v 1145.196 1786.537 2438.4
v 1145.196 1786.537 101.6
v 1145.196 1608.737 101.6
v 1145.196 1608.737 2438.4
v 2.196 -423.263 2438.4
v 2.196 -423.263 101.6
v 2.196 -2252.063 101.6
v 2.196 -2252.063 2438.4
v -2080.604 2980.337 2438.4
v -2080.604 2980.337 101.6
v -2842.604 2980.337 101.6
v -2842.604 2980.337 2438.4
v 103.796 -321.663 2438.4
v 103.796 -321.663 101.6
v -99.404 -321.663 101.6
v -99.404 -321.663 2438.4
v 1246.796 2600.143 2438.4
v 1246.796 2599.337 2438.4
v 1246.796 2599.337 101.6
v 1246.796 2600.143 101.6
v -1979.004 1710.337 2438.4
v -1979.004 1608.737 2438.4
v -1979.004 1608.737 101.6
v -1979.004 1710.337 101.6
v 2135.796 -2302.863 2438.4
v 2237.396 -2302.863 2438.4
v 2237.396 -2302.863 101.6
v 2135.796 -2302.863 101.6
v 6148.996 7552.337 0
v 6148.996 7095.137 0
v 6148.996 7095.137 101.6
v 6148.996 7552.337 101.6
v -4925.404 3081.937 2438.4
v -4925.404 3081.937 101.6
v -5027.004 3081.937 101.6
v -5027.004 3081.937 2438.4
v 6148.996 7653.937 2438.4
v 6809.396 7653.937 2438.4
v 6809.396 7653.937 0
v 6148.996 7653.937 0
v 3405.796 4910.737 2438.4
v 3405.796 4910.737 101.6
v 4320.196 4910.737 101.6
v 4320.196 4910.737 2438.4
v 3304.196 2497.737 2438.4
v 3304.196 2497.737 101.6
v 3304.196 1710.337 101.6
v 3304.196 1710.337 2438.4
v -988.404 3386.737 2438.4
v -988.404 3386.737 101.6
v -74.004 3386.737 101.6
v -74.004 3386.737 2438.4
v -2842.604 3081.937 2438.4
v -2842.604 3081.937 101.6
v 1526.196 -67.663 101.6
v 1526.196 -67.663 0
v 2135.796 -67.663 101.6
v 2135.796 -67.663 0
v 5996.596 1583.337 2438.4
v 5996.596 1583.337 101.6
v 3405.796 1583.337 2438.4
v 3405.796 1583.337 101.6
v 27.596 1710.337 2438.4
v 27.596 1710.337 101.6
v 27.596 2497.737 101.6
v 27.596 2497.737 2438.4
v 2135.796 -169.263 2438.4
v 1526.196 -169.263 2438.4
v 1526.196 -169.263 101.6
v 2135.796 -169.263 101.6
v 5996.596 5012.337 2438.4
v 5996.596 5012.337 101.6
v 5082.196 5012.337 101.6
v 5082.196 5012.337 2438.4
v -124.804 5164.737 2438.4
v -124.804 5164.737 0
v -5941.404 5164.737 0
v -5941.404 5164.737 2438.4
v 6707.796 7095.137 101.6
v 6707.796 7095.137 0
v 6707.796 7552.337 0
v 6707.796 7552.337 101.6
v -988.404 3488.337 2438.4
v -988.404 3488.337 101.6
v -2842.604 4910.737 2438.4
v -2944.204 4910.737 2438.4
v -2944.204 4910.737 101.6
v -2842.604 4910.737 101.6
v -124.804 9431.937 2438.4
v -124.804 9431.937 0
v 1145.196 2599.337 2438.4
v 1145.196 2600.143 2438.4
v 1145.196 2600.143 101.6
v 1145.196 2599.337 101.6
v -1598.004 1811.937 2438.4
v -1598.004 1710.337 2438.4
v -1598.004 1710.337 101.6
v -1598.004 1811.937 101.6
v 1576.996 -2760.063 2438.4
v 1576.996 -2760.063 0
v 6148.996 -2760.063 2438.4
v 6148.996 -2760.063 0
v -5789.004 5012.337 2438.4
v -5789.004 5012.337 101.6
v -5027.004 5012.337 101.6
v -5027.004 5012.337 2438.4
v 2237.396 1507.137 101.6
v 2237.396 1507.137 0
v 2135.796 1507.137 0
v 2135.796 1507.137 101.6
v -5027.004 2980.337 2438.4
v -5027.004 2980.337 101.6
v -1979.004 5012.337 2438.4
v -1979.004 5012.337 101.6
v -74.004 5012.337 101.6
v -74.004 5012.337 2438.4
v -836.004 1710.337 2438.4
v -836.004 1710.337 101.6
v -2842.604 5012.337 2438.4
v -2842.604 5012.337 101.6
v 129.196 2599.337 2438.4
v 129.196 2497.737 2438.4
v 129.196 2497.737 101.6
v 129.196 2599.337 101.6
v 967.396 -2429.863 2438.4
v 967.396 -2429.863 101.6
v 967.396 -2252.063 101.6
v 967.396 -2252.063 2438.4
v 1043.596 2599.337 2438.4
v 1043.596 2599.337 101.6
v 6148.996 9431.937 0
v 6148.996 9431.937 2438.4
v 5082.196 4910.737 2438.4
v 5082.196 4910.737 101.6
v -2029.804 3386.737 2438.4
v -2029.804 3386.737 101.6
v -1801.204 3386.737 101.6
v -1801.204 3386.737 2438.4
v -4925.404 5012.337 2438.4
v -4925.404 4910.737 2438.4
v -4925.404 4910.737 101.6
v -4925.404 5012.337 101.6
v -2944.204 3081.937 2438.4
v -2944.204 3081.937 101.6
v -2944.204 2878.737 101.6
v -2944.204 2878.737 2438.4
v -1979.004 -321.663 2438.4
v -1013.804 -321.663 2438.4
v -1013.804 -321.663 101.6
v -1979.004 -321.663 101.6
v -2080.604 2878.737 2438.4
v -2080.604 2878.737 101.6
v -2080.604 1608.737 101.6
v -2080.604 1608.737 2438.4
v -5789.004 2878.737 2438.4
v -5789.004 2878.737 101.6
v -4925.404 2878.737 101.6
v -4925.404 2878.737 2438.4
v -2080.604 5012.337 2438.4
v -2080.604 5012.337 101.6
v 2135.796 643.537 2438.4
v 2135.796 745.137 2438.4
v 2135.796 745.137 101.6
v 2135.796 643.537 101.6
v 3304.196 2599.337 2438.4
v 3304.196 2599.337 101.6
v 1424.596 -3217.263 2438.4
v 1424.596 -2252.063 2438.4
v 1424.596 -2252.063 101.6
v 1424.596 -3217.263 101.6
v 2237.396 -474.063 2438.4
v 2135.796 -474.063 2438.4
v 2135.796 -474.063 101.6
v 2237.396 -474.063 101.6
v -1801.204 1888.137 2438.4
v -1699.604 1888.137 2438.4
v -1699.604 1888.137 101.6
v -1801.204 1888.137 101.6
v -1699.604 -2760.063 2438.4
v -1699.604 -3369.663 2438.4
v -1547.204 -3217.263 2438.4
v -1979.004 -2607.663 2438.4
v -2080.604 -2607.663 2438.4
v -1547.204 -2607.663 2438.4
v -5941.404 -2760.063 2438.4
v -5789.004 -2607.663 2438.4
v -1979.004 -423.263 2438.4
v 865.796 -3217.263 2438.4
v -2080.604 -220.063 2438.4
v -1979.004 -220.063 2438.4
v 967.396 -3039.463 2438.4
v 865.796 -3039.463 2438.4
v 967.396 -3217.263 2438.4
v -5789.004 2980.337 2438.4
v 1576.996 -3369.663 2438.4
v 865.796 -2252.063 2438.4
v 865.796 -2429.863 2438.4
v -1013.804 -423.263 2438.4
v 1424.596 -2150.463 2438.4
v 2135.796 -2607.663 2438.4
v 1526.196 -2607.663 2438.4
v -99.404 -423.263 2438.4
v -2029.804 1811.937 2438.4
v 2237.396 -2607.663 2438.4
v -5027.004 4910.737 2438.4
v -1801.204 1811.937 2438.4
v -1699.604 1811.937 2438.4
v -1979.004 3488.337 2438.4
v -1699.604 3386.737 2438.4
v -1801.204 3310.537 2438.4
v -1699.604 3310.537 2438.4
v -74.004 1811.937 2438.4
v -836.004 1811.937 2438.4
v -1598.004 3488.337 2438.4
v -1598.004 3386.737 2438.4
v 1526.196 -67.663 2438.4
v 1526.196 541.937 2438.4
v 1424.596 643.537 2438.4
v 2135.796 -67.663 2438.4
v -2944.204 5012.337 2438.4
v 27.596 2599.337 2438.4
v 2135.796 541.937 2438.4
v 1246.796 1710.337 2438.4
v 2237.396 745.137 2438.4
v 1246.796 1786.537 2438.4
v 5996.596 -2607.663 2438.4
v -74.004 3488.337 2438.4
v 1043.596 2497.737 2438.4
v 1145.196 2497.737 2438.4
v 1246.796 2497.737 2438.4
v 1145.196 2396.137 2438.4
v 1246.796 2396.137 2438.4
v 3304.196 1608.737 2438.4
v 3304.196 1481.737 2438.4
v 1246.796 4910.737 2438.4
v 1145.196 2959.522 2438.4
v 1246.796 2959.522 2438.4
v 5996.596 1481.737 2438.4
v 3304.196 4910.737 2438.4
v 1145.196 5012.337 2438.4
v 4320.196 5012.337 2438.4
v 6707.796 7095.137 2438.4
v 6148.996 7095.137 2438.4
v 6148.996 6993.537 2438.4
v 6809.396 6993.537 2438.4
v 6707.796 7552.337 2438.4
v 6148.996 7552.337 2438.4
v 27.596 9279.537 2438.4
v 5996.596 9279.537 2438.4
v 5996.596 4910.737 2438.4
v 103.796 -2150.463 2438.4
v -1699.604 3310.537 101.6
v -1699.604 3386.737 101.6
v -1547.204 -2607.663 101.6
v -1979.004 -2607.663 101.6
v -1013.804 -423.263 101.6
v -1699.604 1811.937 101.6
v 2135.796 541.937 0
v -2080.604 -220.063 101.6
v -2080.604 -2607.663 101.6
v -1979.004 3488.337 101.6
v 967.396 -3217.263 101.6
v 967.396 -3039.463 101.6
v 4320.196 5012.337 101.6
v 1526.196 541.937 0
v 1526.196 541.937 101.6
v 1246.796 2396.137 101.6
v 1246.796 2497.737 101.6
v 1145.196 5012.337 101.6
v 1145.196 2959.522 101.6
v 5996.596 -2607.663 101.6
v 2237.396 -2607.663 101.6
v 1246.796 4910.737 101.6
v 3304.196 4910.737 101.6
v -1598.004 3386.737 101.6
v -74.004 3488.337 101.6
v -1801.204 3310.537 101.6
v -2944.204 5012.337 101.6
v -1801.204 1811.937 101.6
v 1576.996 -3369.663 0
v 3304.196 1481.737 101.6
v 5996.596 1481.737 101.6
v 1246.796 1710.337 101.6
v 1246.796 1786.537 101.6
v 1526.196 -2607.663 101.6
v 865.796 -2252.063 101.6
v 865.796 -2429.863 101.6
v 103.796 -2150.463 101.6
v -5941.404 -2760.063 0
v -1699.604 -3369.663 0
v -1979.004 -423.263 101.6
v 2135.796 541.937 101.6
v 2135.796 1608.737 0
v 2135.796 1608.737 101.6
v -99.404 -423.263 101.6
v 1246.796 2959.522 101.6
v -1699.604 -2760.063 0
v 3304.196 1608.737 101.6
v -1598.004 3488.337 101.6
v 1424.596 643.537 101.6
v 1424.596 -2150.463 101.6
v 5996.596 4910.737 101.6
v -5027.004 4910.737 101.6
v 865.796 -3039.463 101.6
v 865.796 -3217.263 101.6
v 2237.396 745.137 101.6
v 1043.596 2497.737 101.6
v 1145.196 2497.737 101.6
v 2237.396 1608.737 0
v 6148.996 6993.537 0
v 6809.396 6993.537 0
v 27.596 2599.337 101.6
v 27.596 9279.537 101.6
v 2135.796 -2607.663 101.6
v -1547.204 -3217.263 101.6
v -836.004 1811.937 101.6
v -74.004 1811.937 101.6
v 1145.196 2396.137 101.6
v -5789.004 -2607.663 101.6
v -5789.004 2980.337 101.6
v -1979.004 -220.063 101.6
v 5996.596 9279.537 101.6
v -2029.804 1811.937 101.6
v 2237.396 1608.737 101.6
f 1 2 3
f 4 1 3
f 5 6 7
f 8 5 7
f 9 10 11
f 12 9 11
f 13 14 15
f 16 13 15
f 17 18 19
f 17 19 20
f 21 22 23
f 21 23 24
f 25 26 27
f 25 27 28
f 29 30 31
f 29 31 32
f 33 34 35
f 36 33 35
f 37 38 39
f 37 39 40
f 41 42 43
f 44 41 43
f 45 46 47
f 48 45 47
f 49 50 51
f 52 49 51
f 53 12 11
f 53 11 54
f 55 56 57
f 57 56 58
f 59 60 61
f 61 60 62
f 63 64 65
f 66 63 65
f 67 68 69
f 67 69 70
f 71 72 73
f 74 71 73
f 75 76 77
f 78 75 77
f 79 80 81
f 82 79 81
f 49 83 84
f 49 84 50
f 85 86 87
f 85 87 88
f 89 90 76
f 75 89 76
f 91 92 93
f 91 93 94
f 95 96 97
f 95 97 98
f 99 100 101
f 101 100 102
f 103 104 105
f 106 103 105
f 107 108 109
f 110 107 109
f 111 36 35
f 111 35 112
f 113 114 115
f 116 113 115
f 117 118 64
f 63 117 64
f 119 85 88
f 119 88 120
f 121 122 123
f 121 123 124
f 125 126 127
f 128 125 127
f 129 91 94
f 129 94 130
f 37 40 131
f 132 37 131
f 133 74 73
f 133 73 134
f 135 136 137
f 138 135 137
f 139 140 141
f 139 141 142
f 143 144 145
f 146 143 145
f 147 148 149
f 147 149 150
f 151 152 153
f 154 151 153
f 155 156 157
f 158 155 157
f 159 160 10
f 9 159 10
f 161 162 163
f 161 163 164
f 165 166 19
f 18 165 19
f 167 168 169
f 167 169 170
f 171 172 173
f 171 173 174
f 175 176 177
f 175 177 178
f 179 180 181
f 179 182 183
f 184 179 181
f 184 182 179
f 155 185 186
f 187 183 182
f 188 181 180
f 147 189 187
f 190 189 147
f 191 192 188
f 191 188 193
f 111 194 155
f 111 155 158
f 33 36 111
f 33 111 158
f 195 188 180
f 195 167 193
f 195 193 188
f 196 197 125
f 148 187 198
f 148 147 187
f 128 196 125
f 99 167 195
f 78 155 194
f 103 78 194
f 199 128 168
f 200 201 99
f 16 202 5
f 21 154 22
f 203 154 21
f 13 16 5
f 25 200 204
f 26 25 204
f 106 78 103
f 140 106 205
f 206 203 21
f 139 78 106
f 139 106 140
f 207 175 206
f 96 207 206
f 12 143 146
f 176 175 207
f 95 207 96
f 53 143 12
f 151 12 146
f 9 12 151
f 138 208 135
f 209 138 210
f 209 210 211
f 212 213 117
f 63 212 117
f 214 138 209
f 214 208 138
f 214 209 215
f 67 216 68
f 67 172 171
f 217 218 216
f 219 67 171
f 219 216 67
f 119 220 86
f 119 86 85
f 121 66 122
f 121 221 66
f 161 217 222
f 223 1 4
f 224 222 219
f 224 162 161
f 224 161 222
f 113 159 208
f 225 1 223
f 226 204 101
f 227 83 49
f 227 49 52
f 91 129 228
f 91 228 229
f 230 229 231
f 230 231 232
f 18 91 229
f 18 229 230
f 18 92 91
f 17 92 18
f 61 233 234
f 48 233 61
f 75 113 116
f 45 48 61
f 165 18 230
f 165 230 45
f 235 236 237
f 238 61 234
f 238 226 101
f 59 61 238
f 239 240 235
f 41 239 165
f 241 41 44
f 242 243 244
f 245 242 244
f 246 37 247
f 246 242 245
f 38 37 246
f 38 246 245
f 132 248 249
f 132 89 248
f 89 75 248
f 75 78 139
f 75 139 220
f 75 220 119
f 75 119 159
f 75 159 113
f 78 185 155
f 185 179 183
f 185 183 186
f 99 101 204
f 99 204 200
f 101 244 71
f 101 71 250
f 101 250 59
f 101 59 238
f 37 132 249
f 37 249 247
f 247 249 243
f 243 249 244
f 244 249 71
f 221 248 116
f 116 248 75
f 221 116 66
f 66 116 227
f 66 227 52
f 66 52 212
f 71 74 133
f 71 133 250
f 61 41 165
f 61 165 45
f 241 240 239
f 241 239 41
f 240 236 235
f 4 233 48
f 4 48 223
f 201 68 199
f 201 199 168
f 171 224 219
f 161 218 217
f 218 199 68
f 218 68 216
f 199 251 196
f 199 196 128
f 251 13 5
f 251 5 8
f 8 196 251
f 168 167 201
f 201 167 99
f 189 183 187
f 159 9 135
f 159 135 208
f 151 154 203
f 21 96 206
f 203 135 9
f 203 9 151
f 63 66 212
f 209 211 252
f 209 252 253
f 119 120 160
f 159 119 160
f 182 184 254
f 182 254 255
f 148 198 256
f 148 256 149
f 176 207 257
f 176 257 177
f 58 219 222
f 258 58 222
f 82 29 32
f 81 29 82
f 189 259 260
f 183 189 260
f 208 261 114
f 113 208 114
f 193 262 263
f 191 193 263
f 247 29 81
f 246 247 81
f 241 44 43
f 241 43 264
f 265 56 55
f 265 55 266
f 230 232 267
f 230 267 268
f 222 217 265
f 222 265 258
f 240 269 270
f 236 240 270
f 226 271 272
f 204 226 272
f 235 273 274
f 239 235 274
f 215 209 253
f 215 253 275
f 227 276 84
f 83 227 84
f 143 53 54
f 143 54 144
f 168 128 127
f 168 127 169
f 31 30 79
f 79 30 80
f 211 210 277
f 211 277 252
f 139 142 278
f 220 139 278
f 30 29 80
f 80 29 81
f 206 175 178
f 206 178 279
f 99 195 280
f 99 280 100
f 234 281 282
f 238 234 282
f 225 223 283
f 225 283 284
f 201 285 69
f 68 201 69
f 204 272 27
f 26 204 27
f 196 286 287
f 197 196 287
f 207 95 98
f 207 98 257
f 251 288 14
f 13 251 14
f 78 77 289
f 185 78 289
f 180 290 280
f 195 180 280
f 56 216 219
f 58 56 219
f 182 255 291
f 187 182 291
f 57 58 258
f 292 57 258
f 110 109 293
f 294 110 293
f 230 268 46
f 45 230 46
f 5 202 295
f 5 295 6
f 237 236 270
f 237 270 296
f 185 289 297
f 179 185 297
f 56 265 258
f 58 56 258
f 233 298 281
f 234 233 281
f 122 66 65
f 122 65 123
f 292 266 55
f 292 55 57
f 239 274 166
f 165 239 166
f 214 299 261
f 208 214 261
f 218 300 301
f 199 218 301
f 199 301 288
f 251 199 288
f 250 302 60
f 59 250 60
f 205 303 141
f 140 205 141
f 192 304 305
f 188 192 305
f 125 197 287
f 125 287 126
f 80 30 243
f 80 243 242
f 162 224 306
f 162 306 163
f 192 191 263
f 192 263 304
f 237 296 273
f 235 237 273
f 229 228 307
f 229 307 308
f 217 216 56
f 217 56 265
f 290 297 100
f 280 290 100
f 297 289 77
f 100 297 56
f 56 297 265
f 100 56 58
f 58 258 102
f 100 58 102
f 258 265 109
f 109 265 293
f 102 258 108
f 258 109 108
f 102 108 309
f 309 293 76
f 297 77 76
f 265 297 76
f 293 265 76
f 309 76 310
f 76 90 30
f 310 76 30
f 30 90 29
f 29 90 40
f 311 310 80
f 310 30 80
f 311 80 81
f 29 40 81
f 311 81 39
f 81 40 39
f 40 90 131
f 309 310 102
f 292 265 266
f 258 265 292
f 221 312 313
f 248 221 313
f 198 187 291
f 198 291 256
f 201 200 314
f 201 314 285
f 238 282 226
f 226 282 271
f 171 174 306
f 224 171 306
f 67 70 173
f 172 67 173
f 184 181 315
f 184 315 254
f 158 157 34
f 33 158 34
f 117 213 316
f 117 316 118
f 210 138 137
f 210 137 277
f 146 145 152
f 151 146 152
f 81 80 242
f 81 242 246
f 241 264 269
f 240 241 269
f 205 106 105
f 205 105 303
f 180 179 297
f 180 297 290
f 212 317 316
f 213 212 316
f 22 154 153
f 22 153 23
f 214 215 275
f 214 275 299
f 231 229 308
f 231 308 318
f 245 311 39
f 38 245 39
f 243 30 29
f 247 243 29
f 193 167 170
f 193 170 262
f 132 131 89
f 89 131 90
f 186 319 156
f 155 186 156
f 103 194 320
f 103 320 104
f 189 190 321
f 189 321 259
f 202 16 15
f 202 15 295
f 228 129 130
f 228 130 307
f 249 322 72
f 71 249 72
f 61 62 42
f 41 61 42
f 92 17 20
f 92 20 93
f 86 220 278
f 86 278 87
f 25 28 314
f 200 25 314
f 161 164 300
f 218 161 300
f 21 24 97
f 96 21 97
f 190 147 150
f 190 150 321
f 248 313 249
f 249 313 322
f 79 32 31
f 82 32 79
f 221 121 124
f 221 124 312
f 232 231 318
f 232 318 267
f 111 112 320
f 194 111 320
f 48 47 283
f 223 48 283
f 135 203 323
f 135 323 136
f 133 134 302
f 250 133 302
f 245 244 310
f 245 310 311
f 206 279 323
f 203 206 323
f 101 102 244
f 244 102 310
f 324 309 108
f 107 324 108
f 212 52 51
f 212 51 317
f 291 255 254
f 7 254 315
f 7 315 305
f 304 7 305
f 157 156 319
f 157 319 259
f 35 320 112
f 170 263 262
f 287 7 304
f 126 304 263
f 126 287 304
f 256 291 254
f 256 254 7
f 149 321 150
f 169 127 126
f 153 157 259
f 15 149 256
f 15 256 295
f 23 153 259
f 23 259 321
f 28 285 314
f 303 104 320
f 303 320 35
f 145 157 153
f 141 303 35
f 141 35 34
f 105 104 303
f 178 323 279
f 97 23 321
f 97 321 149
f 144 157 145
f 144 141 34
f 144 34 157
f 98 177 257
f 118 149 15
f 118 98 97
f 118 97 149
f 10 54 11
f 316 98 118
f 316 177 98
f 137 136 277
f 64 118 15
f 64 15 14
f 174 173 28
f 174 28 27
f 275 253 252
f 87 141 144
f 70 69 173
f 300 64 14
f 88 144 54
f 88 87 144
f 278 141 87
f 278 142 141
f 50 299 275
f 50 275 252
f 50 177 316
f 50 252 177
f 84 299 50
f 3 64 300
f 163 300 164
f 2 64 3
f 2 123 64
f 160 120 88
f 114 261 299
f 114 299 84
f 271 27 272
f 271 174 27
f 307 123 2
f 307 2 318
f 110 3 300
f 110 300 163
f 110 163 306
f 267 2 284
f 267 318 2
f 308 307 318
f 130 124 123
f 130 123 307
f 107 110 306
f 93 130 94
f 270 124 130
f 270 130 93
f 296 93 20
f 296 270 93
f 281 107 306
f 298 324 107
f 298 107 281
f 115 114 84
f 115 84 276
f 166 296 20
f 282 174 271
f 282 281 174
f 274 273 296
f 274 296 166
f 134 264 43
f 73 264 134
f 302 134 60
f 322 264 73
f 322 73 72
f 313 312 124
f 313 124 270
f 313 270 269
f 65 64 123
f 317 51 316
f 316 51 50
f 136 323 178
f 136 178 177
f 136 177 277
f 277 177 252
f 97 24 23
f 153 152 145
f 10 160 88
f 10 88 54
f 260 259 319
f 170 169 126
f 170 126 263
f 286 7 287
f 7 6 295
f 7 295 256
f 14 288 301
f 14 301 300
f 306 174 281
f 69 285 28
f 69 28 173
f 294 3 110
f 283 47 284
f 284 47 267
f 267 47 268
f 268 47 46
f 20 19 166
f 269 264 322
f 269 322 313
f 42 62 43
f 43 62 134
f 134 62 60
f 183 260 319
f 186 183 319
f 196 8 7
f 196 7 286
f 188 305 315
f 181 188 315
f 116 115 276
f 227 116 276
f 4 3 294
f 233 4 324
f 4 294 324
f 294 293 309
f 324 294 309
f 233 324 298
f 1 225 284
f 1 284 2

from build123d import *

# Parameters (mm, degrees)
F1_DEPTH = 101.6
F0_W     = 609.6
F0_H     = 609.6
F0_W_2   = 558.8
F0_H_2   = 457.2
F2_DEPTH = 2438.4


with BuildPart() as f1:
    # F0 (on Top) → F1 (new body)
    with BuildSketch(Plane.XY):
        Polygon((5996.5963871956, 9279.5369567871), (27.5963871956, 9279.5369567871), (27.5963871956, 5012.3369567871), (27.5963871956, 2599.3369567871), (129.1963871956, 2599.3369567871), (129.1963871956, 2497.7369567871), (27.5963871956, 2497.7369567871), (27.5963871956, 1710.3369567871), (-836.0036128044, 1710.3369567871), (-836.0036128044, 1811.9369567871), (-74.0036128044, 1811.9369567871), (-74.0036128044, 3386.7369567871), (-988.4036128044, 3386.7369567871), (-988.4036128044, 3488.3369567871), (-74.0036128044, 3488.3369567871), (-74.0036128044, 5012.3369567871), (-1979.0036128044, 5012.3369567871), (-1979.0036128044, 3488.3369567871), (-1598.0036128044, 3488.3369567871), (-1598.0036128044, 3386.7369567871), (-1699.6036128044, 3386.7369567871), (-1699.6036128044, 3310.5369567871), (-1801.2036128044, 3310.5369567871), (-1801.2036128044, 3386.7369567871), (-2029.8036128044, 3386.7369567871), (-2029.8036128044, 1811.9369567871), (-1801.2036128044, 1811.9369567871), (-1801.2036128044, 1888.1369567871), (-1699.6036128044, 1888.1369567871), (-1699.6036128044, 1811.9369567871), (-1598.0036128044, 1811.9369567871), (-1598.0036128044, 1710.3369567871), (-1979.0036128044, 1710.3369567871), (-1979.0036128044, 1608.7369567871), (-2080.6036128044, 1608.7369567871), (-2080.6036128044, 2878.7369567871), (-2944.2036128044, 2878.7369567871), (-2944.2036128044, 3081.9369567871), (-2842.6036128044, 3081.9369567871), (-2842.6036128044, 2980.3369567871), (-2080.6036128044, 2980.3369567871), (-2080.6036128044, 5012.3369567871), (-2842.6036128044, 5012.3369567871), (-2842.6036128044, 4910.7369567871), (-2944.2036128044, 4910.7369567871), (-2944.2036128044, 5012.3369567871), (-4925.4036128044, 5012.3369567871), (-4925.4036128044, 4910.7369567871), (-5027.0036128044, 4910.7369567871), (-5027.0036128044, 5012.3369567871), (-5789.0036128044, 5012.3369567871), (-5789.0036128044, 2980.3369567871), (-5027.0036128044, 2980.3369567871), (-5027.0036128044, 3081.9369567871), (-4925.4036128044, 3081.9369567871), (-4925.4036128044, 2878.7369567871), (-5789.0036128044, 2878.7369567871), (-5789.0036128044, -2607.6630432129), (-2080.6036128044, -2607.6630432129), (-2080.6036128044, -220.0630432129), (-1979.0036128044, -220.0630432129), (-1979.0036128044, -321.6630432129), (-1013.8036128044, -321.6630432129), (-1013.8036128044, -423.2630432129), (-1979.0036128044, -423.2630432129), (-1979.0036128044, -2607.6630432129), (-1547.2036128044, -2607.6630432129), (-1547.2036128044, -3217.2630432129), (865.7963871956, -3217.2630432129), (865.7963871956, -3039.4630432129), (967.3963871956, -3039.4630432129), (967.3963871956, -3217.2630432129), (1424.5963871956, -3217.2630432129), (1424.5963871956, -2607.6630432129), (1424.5963871956, -2252.0630432129), (967.3963871956, -2252.0630432129), (967.3963871956, -2429.8630432129), (865.7963871956, -2429.8630432129), (865.7963871956, -2252.0630432129), (2.1963871956, -2252.0630432129), (2.1963871956, -423.2630432129), (-99.4036128044, -423.2630432129), (-99.4036128044, -321.6630432129), (103.7963871956, -321.6630432129), (103.7963871956, -2150.4630432129), (1424.5963871956, -2150.4630432129), (1424.5963871956, 643.5369567871), (2135.7963871956, 643.5369567871), (2135.7963871956, 745.1369567871), (2237.3963871956, 745.1369567871), (2237.3963871956, -474.0630432129), (2135.7963871956, -474.0630432129), (2135.7963871956, -169.2630432129), (1526.1963871956, -169.2630432129), (1526.1963871956, -2607.6630432129), (2135.7963871956, -2607.6630432129), (2135.7963871956, -2302.8630432129), (2237.3963871956, -2302.8630432129), (2237.3963871956, -2607.6630432129), (5996.5963871956, -2607.6630432129), (5996.5963871956, 1481.7369567871), (3304.1963871956, 1481.7369567871), (3304.1963871956, 1608.7369567871), (2237.3963871956, 1608.7369567871), (2237.3963871956, 1507.1369567871), (2135.7963871956, 1507.1369567871), (2135.7963871956, 1608.7369567871), (1145.1963871956, 1608.7369567871), (1145.1963871956, 1786.5369567871), (1246.7963871956, 1786.5369567871), (1246.7963871956, 1710.3369567871), (3304.1963871956, 1710.3369567871), (3304.1963871956, 2497.7369567871), (1246.7963871956, 2497.7369567871), (1246.7963871956, 2396.1369567871), (1145.1963871956, 2396.1369567871), (1145.1963871956, 2497.7369567871), (1043.5963871956, 2497.7369567871), (1043.5963871956, 2599.3369567871), (1145.1963871956, 2599.3369567871), (1145.1963871956, 2600.1431941986), (1246.7963871956, 2600.1431941986), (1246.7963871956, 2599.3369567871), (3304.1963871956, 2599.3369567871), (3304.1963871956, 4910.7369567871), (1246.7963871956, 4910.7369567871), (1246.7963871956, 2959.5220088959), (1145.1963871956, 2959.5220088959), (1145.1963871956, 5012.3369567871), (4320.1963871956, 5012.3369567871), (4320.1963871956, 4910.7369567871), (3405.7963871956, 4910.7369567871), (3405.7963871956, 2497.7369567871), (3405.7963871956, 1583.3369567871), (5996.5963871956, 1583.3369567871), (5996.5963871956, 4910.7369567871), (5082.1963871956, 4910.7369567871), (5082.1963871956, 5012.3369567871), (5996.5963871956, 5012.3369567871), align=None)
    extrude(amount=F1_DEPTH)

    # F0 (on Top) → F2 (join)
    with BuildSketch(Plane.XY):
        Polygon((6148.9963871956, 9431.9369567871), (-124.8036128044, 9431.9369567871), (-124.8036128044, 5164.7369567871), (-5941.4036128044, 5164.7369567871), (-5941.4036128044, -2760.0630432129), (-1699.6036128044, -2760.0630432129), (-1699.6036128044, -3369.6630432129), (1576.9963871956, -3369.6630432129), (1576.9963871956, -2760.0630432129), (6148.9963871956, -2760.0630432129), (6148.9963871956, 6993.5369567871), (6809.3963871956, 6993.5369567871), (6809.3963871956, 7653.9369567871), (6148.9963871956, 7653.9369567871), align=None)
        with Locations((1830.9963871956, 237.1369567871)):
            Rectangle(F0_W, F0_H, mode=Mode.SUBTRACT)
        Polygon((27.5963871956, 5012.3369567871), (27.5963871956, 9279.5369567871), (5996.5963871956, 9279.5369567871), (5996.5963871956, 5012.3369567871), (5082.1963871956, 5012.3369567871), (5082.1963871956, 4910.7369567871), (5996.5963871956, 4910.7369567871), (5996.5963871956, 1583.3369567871), (3405.7963871956, 1583.3369567871), (3405.7963871956, 2497.7369567871), (3405.7963871956, 4910.7369567871), (4320.1963871956, 4910.7369567871), (4320.1963871956, 5012.3369567871), (1145.1963871956, 5012.3369567871), (1145.1963871956, 2959.5220088959), (1246.7963871956, 2959.5220088959), (1246.7963871956, 4910.7369567871), (3304.1963871956, 4910.7369567871), (3304.1963871956, 2599.3369567871), (1246.7963871956, 2599.3369567871), (1246.7963871956, 2600.1431941986), (1145.1963871956, 2600.1431941986), (1145.1963871956, 2599.3369567871), (1043.5963871956, 2599.3369567871), (1043.5963871956, 2497.7369567871), (1145.1963871956, 2497.7369567871), (1145.1963871956, 2396.1369567871), (1246.7963871956, 2396.1369567871), (1246.7963871956, 2497.7369567871), (3304.1963871956, 2497.7369567871), (3304.1963871956, 1710.3369567871), (1246.7963871956, 1710.3369567871), (1246.7963871956, 1786.5369567871), (1145.1963871956, 1786.5369567871), (1145.1963871956, 1608.7369567871), (2135.7963871956, 1608.7369567871), (2237.3963871956, 1608.7369567871), (3304.1963871956, 1608.7369567871), (3304.1963871956, 1481.7369567871), (5996.5963871956, 1481.7369567871), (5996.5963871956, -2607.6630432129), (2237.3963871956, -2607.6630432129), (2237.3963871956, -2302.8630432129), (2135.7963871956, -2302.8630432129), (2135.7963871956, -2607.6630432129), (1526.1963871956, -2607.6630432129), (1526.1963871956, -169.2630432129), (2135.7963871956, -169.2630432129), (2135.7963871956, -474.0630432129), (2237.3963871956, -474.0630432129), (2237.3963871956, 745.1369567871), (2135.7963871956, 745.1369567871), (2135.7963871956, 643.5369567871), (1424.5963871956, 643.5369567871), (1424.5963871956, -2150.4630432129), (103.7963871956, -2150.4630432129), (103.7963871956, -321.6630432129), (-99.4036128044, -321.6630432129), (-99.4036128044, -423.2630432129), (2.1963871956, -423.2630432129), (2.1963871956, -2252.0630432129), (865.7963871956, -2252.0630432129), (865.7963871956, -2429.8630432129), (967.3963871956, -2429.8630432129), (967.3963871956, -2252.0630432129), (1424.5963871956, -2252.0630432129), (1424.5963871956, -2607.6630432129), (1424.5963871956, -3217.2630432129), (967.3963871956, -3217.2630432129), (967.3963871956, -3039.4630432129), (865.7963871956, -3039.4630432129), (865.7963871956, -3217.2630432129), (-1547.2036128044, -3217.2630432129), (-1547.2036128044, -2607.6630432129), (-1979.0036128044, -2607.6630432129), (-1979.0036128044, -423.2630432129), (-1013.8036128044, -423.2630432129), (-1013.8036128044, -321.6630432129), (-1979.0036128044, -321.6630432129), (-1979.0036128044, -220.0630432129), (-2080.6036128044, -220.0630432129), (-2080.6036128044, -2607.6630432129), (-5789.0036128044, -2607.6630432129), (-5789.0036128044, 2878.7369567871), (-4925.4036128044, 2878.7369567871), (-4925.4036128044, 3081.9369567871), (-5027.0036128044, 3081.9369567871), (-5027.0036128044, 2980.3369567871), (-5789.0036128044, 2980.3369567871), (-5789.0036128044, 5012.3369567871), (-5027.0036128044, 5012.3369567871), (-5027.0036128044, 4910.7369567871), (-4925.4036128044, 4910.7369567871), (-4925.4036128044, 5012.3369567871), (-2944.2036128044, 5012.3369567871), (-2944.2036128044, 4910.7369567871), (-2842.6036128044, 4910.7369567871), (-2842.6036128044, 5012.3369567871), (-2080.6036128044, 5012.3369567871), (-2080.6036128044, 2980.3369567871), (-2842.6036128044, 2980.3369567871), (-2842.6036128044, 3081.9369567871), (-2944.2036128044, 3081.9369567871), (-2944.2036128044, 2878.7369567871), (-2080.6036128044, 2878.7369567871), (-2080.6036128044, 1608.7369567871), (-1979.0036128044, 1608.7369567871), (-1979.0036128044, 1710.3369567871), (-1598.0036128044, 1710.3369567871), (-1598.0036128044, 1811.9369567871), (-1699.6036128044, 1811.9369567871), (-1699.6036128044, 1888.1369567871), (-1801.2036128044, 1888.1369567871), (-1801.2036128044, 1811.9369567871), (-2029.8036128044, 1811.9369567871), (-2029.8036128044, 3386.7369567871), (-1801.2036128044, 3386.7369567871), (-1801.2036128044, 3310.5369567871), (-1699.6036128044, 3310.5369567871), (-1699.6036128044, 3386.7369567871), (-1598.0036128044, 3386.7369567871), (-1598.0036128044, 3488.3369567871), (-1979.0036128044, 3488.3369567871), (-1979.0036128044, 5012.3369567871), (-74.0036128044, 5012.3369567871), (-74.0036128044, 3488.3369567871), (-988.4036128044, 3488.3369567871), (-988.4036128044, 3386.7369567871), (-74.0036128044, 3386.7369567871), (-74.0036128044, 1811.9369567871), (-836.0036128044, 1811.9369567871), (-836.0036128044, 1710.3369567871), (27.5963871956, 1710.3369567871), (27.5963871956, 2497.7369567871), (129.1963871956, 2497.7369567871), (129.1963871956, 2599.3369567871), (27.5963871956, 2599.3369567871), align=None, mode=Mode.SUBTRACT)
        with Locations((6428.3963871956, 7323.7369567871)):
            Rectangle(F0_W_2, F0_H_2, mode=Mode.SUBTRACT)
    extrude(amount=F2_DEPTH)


with BuildPart() as f1b:
    # F0 (on Top) → F1, piece 2 (new body)
    with BuildSketch(Plane.XY):
        with Locations((1830.9963871956, 237.1369567871)):
            Rectangle(F0_W, F0_H)
    extrude(amount=F1_DEPTH)


with BuildPart() as f1c:
    # F0 (on Top) → F1, piece 3 (new body)
    with BuildSketch(Plane.XY):
        with Locations((6428.3963871956, 7323.7369567871)):
            Rectangle(F0_W_2, F0_H_2)
    extrude(amount=F1_DEPTH)


solid = Compound([f1.part, f1b.part, f1c.part])
